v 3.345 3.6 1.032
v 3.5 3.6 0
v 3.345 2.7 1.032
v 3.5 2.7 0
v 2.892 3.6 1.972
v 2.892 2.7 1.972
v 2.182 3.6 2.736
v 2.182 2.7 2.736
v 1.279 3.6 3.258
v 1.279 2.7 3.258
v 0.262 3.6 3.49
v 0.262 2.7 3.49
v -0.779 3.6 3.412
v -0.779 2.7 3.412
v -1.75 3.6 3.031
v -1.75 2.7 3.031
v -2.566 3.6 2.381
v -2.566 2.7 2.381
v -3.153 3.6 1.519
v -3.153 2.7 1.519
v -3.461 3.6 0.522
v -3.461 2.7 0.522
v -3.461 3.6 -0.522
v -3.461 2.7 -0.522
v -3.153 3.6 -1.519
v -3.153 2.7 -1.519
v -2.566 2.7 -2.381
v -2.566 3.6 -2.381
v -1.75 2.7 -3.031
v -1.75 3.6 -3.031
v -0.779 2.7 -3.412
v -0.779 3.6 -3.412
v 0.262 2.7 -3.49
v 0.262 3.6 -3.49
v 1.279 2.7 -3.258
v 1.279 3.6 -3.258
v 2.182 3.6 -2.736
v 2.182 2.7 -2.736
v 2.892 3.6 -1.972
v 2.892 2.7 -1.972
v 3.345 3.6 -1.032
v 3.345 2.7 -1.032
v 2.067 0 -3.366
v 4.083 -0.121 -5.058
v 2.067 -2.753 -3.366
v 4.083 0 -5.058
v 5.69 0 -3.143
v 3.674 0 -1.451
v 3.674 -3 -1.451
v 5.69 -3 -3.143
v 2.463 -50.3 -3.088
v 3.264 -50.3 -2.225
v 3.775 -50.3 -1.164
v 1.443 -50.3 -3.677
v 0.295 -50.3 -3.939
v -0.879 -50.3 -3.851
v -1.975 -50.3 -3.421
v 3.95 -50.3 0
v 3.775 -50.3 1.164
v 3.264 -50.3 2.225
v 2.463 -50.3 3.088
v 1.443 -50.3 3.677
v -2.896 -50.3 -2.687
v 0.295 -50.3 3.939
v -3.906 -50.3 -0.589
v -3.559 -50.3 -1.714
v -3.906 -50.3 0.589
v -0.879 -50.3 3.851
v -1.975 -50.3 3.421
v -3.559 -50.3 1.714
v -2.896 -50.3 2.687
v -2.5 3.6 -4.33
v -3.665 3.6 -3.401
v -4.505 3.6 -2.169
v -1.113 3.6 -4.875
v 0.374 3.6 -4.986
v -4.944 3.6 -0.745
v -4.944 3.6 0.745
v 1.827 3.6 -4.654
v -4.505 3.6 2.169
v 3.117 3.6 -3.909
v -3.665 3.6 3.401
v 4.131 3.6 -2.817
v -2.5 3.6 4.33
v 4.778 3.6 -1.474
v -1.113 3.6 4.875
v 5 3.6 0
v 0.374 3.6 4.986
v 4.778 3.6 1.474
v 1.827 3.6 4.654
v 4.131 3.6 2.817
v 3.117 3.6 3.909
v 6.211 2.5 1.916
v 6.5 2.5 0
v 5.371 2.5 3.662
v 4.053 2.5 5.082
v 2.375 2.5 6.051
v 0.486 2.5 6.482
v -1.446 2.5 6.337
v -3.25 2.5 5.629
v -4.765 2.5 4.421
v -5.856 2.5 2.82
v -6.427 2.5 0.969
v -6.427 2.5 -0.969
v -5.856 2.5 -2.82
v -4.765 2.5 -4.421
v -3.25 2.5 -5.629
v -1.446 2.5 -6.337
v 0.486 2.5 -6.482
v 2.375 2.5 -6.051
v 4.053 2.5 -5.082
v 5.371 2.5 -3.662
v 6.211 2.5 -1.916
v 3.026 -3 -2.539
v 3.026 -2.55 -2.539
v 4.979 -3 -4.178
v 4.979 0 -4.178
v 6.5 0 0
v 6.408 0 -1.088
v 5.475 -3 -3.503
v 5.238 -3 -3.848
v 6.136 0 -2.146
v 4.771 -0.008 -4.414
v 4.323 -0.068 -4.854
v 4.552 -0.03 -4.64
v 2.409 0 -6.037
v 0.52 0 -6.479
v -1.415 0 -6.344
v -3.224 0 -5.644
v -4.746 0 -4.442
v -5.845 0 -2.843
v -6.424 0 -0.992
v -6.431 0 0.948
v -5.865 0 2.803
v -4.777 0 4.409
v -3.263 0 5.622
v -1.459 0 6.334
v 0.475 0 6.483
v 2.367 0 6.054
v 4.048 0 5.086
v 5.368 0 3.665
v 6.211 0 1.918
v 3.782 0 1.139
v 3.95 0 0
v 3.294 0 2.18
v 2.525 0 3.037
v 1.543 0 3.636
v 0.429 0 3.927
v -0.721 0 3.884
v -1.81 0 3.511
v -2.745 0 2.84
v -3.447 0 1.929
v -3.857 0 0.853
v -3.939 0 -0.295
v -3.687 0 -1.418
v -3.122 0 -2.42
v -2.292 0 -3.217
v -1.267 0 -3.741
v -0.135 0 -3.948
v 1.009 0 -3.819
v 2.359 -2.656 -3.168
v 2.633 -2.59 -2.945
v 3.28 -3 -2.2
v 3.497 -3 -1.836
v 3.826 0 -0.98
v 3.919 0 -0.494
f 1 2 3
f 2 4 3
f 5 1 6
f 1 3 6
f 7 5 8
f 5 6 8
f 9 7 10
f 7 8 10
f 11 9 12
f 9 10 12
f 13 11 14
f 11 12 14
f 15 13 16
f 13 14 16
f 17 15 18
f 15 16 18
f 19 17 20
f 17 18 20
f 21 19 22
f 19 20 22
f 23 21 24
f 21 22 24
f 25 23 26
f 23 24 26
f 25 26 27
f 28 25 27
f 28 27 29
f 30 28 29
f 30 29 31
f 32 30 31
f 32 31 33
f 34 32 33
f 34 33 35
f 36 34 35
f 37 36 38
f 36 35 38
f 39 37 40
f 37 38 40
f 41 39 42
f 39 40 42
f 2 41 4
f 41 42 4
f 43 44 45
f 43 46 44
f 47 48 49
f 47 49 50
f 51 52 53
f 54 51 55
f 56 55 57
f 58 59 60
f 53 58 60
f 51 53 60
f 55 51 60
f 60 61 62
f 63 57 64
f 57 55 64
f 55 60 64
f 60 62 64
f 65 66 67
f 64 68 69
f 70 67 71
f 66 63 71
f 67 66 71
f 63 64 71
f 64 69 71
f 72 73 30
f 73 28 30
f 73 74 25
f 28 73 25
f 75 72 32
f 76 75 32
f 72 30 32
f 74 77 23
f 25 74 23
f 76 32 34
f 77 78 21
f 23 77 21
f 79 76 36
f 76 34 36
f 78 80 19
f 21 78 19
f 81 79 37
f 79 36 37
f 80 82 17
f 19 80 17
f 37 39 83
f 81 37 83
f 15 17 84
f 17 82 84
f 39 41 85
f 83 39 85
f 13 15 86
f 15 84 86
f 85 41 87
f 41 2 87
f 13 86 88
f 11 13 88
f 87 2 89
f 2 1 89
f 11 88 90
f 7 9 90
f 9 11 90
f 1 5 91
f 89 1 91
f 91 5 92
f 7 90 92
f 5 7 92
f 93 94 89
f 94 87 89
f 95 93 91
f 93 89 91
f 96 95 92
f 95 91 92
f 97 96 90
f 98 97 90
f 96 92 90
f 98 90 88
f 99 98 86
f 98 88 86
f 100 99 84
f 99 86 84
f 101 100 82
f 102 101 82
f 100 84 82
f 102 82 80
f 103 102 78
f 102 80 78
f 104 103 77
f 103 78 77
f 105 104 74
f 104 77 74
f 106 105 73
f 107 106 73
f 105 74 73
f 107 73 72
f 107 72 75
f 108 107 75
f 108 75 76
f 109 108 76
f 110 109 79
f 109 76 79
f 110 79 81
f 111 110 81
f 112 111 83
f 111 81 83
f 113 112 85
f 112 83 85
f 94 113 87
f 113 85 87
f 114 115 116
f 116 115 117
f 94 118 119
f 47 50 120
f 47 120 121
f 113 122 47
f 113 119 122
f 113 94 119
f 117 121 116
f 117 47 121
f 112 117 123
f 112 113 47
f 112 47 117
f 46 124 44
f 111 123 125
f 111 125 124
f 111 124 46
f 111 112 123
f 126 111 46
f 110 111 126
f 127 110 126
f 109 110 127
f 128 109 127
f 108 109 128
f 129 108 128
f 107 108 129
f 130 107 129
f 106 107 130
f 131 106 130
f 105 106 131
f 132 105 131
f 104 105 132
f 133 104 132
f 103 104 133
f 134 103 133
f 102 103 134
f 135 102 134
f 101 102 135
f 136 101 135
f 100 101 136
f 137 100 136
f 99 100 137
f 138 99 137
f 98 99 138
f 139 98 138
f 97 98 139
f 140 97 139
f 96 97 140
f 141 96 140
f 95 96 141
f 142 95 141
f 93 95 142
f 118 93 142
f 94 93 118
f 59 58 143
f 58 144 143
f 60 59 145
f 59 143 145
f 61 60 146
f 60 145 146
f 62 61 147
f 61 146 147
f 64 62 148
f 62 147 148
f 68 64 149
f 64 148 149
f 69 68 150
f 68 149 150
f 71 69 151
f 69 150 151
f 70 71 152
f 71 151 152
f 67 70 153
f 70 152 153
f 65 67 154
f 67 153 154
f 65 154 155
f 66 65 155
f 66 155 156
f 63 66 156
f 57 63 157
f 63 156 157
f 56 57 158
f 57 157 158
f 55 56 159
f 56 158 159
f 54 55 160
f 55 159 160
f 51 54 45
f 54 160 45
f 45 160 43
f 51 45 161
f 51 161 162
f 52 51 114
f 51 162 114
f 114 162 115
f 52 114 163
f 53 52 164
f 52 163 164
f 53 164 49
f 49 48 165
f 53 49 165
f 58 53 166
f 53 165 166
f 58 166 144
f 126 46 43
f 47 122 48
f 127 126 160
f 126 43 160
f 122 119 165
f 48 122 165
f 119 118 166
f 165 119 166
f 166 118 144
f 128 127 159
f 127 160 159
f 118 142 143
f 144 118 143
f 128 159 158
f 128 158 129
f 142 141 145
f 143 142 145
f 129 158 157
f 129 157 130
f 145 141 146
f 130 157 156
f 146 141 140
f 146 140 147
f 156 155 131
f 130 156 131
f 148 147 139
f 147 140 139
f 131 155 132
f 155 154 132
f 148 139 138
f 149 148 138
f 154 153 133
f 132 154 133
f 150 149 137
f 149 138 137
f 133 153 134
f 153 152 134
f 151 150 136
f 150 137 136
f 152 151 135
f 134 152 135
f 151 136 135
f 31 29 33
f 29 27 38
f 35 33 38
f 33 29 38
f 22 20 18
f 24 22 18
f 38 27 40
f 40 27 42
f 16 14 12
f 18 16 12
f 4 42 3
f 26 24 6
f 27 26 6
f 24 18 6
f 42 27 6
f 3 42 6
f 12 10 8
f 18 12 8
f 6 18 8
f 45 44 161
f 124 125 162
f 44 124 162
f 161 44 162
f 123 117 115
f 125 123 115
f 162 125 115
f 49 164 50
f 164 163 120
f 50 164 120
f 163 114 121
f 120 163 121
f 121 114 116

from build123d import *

# Parameters (mm, degrees)
SKETCH1_W           = 3.95
SKETCH1_H           = 50.3
BOSS_EXTRUDE1_DEPTH = 1.25
SKETCH4_W           = 6.5
SKETCH4_H           = 3
BOSS_EXTRUDE2_DEPTH = 1.25
SKETCH5_OUTSIDE_W   = 26.39
SKETCH5_OUTSIDE_H   = 26.39
SKETCH5_OUTSIDE_R   = 6.5
CUT_EXTRUDE1_DEPTH  = 55.678240645


with BuildPart() as part:
    # Sketch1 → Revolve1 (revolve)
    with BuildSketch(Plane.XY):
        with Locations((1.975, -25.15)):
            Rectangle(SKETCH1_W, SKETCH1_H)
    revolve(axis=Axis((0, 6.295, 0), (0, -1, 0)))

    # Sketch2 → Revolve2 (revolve)
    with BuildSketch(Plane.XY):
        Polygon((0, 0), (6.5, 0), (6.5, 2.5), (5, 3.6), (3.5, 3.6), (3.5, 2.7), (0, 2.7), align=None)
    revolve(axis=Axis((0, 6.295, 0), (0, -1, 0)))

    # Sketch3 → Boss-Extrude1 (add)
    with BuildSketch(Plane(origin=(0, 0, 0), x_dir=(0.7660444431189771, 0, -0.6427876096865406), z_dir=(0.6427876096865406, 0, 0.7660444431189771))):
        Polygon((0, 0), (6.5, 0), (0, -6.5), align=None)
    extrude(amount=-BOSS_EXTRUDE1_DEPTH)

    # Sketch4 → Boss-Extrude2 (add)
    with BuildSketch(Plane(origin=(0, 0, 0), x_dir=(0.7660444431189771, 0, -0.6427876096865406), z_dir=(0.6427876096865406, 0, 0.7660444431189771))):
        with Locations((3.25, -1.5)):
            Rectangle(SKETCH4_W, SKETCH4_H)
    extrude(amount=BOSS_EXTRUDE2_DEPTH)

    # Sketch5 outside → Cut-Extrude1 (cut, through all)
    with BuildSketch(Plane(origin=(0, 3.6, 0), x_dir=(1, 0, 0), z_dir=(0, 1, 0))):
        Rectangle(SKETCH5_OUTSIDE_W, SKETCH5_OUTSIDE_H)
        Circle(SKETCH5_OUTSIDE_R, mode=Mode.SUBTRACT)
    extrude(amount=-CUT_EXTRUDE1_DEPTH, mode=Mode.SUBTRACT)


solid = part.part
